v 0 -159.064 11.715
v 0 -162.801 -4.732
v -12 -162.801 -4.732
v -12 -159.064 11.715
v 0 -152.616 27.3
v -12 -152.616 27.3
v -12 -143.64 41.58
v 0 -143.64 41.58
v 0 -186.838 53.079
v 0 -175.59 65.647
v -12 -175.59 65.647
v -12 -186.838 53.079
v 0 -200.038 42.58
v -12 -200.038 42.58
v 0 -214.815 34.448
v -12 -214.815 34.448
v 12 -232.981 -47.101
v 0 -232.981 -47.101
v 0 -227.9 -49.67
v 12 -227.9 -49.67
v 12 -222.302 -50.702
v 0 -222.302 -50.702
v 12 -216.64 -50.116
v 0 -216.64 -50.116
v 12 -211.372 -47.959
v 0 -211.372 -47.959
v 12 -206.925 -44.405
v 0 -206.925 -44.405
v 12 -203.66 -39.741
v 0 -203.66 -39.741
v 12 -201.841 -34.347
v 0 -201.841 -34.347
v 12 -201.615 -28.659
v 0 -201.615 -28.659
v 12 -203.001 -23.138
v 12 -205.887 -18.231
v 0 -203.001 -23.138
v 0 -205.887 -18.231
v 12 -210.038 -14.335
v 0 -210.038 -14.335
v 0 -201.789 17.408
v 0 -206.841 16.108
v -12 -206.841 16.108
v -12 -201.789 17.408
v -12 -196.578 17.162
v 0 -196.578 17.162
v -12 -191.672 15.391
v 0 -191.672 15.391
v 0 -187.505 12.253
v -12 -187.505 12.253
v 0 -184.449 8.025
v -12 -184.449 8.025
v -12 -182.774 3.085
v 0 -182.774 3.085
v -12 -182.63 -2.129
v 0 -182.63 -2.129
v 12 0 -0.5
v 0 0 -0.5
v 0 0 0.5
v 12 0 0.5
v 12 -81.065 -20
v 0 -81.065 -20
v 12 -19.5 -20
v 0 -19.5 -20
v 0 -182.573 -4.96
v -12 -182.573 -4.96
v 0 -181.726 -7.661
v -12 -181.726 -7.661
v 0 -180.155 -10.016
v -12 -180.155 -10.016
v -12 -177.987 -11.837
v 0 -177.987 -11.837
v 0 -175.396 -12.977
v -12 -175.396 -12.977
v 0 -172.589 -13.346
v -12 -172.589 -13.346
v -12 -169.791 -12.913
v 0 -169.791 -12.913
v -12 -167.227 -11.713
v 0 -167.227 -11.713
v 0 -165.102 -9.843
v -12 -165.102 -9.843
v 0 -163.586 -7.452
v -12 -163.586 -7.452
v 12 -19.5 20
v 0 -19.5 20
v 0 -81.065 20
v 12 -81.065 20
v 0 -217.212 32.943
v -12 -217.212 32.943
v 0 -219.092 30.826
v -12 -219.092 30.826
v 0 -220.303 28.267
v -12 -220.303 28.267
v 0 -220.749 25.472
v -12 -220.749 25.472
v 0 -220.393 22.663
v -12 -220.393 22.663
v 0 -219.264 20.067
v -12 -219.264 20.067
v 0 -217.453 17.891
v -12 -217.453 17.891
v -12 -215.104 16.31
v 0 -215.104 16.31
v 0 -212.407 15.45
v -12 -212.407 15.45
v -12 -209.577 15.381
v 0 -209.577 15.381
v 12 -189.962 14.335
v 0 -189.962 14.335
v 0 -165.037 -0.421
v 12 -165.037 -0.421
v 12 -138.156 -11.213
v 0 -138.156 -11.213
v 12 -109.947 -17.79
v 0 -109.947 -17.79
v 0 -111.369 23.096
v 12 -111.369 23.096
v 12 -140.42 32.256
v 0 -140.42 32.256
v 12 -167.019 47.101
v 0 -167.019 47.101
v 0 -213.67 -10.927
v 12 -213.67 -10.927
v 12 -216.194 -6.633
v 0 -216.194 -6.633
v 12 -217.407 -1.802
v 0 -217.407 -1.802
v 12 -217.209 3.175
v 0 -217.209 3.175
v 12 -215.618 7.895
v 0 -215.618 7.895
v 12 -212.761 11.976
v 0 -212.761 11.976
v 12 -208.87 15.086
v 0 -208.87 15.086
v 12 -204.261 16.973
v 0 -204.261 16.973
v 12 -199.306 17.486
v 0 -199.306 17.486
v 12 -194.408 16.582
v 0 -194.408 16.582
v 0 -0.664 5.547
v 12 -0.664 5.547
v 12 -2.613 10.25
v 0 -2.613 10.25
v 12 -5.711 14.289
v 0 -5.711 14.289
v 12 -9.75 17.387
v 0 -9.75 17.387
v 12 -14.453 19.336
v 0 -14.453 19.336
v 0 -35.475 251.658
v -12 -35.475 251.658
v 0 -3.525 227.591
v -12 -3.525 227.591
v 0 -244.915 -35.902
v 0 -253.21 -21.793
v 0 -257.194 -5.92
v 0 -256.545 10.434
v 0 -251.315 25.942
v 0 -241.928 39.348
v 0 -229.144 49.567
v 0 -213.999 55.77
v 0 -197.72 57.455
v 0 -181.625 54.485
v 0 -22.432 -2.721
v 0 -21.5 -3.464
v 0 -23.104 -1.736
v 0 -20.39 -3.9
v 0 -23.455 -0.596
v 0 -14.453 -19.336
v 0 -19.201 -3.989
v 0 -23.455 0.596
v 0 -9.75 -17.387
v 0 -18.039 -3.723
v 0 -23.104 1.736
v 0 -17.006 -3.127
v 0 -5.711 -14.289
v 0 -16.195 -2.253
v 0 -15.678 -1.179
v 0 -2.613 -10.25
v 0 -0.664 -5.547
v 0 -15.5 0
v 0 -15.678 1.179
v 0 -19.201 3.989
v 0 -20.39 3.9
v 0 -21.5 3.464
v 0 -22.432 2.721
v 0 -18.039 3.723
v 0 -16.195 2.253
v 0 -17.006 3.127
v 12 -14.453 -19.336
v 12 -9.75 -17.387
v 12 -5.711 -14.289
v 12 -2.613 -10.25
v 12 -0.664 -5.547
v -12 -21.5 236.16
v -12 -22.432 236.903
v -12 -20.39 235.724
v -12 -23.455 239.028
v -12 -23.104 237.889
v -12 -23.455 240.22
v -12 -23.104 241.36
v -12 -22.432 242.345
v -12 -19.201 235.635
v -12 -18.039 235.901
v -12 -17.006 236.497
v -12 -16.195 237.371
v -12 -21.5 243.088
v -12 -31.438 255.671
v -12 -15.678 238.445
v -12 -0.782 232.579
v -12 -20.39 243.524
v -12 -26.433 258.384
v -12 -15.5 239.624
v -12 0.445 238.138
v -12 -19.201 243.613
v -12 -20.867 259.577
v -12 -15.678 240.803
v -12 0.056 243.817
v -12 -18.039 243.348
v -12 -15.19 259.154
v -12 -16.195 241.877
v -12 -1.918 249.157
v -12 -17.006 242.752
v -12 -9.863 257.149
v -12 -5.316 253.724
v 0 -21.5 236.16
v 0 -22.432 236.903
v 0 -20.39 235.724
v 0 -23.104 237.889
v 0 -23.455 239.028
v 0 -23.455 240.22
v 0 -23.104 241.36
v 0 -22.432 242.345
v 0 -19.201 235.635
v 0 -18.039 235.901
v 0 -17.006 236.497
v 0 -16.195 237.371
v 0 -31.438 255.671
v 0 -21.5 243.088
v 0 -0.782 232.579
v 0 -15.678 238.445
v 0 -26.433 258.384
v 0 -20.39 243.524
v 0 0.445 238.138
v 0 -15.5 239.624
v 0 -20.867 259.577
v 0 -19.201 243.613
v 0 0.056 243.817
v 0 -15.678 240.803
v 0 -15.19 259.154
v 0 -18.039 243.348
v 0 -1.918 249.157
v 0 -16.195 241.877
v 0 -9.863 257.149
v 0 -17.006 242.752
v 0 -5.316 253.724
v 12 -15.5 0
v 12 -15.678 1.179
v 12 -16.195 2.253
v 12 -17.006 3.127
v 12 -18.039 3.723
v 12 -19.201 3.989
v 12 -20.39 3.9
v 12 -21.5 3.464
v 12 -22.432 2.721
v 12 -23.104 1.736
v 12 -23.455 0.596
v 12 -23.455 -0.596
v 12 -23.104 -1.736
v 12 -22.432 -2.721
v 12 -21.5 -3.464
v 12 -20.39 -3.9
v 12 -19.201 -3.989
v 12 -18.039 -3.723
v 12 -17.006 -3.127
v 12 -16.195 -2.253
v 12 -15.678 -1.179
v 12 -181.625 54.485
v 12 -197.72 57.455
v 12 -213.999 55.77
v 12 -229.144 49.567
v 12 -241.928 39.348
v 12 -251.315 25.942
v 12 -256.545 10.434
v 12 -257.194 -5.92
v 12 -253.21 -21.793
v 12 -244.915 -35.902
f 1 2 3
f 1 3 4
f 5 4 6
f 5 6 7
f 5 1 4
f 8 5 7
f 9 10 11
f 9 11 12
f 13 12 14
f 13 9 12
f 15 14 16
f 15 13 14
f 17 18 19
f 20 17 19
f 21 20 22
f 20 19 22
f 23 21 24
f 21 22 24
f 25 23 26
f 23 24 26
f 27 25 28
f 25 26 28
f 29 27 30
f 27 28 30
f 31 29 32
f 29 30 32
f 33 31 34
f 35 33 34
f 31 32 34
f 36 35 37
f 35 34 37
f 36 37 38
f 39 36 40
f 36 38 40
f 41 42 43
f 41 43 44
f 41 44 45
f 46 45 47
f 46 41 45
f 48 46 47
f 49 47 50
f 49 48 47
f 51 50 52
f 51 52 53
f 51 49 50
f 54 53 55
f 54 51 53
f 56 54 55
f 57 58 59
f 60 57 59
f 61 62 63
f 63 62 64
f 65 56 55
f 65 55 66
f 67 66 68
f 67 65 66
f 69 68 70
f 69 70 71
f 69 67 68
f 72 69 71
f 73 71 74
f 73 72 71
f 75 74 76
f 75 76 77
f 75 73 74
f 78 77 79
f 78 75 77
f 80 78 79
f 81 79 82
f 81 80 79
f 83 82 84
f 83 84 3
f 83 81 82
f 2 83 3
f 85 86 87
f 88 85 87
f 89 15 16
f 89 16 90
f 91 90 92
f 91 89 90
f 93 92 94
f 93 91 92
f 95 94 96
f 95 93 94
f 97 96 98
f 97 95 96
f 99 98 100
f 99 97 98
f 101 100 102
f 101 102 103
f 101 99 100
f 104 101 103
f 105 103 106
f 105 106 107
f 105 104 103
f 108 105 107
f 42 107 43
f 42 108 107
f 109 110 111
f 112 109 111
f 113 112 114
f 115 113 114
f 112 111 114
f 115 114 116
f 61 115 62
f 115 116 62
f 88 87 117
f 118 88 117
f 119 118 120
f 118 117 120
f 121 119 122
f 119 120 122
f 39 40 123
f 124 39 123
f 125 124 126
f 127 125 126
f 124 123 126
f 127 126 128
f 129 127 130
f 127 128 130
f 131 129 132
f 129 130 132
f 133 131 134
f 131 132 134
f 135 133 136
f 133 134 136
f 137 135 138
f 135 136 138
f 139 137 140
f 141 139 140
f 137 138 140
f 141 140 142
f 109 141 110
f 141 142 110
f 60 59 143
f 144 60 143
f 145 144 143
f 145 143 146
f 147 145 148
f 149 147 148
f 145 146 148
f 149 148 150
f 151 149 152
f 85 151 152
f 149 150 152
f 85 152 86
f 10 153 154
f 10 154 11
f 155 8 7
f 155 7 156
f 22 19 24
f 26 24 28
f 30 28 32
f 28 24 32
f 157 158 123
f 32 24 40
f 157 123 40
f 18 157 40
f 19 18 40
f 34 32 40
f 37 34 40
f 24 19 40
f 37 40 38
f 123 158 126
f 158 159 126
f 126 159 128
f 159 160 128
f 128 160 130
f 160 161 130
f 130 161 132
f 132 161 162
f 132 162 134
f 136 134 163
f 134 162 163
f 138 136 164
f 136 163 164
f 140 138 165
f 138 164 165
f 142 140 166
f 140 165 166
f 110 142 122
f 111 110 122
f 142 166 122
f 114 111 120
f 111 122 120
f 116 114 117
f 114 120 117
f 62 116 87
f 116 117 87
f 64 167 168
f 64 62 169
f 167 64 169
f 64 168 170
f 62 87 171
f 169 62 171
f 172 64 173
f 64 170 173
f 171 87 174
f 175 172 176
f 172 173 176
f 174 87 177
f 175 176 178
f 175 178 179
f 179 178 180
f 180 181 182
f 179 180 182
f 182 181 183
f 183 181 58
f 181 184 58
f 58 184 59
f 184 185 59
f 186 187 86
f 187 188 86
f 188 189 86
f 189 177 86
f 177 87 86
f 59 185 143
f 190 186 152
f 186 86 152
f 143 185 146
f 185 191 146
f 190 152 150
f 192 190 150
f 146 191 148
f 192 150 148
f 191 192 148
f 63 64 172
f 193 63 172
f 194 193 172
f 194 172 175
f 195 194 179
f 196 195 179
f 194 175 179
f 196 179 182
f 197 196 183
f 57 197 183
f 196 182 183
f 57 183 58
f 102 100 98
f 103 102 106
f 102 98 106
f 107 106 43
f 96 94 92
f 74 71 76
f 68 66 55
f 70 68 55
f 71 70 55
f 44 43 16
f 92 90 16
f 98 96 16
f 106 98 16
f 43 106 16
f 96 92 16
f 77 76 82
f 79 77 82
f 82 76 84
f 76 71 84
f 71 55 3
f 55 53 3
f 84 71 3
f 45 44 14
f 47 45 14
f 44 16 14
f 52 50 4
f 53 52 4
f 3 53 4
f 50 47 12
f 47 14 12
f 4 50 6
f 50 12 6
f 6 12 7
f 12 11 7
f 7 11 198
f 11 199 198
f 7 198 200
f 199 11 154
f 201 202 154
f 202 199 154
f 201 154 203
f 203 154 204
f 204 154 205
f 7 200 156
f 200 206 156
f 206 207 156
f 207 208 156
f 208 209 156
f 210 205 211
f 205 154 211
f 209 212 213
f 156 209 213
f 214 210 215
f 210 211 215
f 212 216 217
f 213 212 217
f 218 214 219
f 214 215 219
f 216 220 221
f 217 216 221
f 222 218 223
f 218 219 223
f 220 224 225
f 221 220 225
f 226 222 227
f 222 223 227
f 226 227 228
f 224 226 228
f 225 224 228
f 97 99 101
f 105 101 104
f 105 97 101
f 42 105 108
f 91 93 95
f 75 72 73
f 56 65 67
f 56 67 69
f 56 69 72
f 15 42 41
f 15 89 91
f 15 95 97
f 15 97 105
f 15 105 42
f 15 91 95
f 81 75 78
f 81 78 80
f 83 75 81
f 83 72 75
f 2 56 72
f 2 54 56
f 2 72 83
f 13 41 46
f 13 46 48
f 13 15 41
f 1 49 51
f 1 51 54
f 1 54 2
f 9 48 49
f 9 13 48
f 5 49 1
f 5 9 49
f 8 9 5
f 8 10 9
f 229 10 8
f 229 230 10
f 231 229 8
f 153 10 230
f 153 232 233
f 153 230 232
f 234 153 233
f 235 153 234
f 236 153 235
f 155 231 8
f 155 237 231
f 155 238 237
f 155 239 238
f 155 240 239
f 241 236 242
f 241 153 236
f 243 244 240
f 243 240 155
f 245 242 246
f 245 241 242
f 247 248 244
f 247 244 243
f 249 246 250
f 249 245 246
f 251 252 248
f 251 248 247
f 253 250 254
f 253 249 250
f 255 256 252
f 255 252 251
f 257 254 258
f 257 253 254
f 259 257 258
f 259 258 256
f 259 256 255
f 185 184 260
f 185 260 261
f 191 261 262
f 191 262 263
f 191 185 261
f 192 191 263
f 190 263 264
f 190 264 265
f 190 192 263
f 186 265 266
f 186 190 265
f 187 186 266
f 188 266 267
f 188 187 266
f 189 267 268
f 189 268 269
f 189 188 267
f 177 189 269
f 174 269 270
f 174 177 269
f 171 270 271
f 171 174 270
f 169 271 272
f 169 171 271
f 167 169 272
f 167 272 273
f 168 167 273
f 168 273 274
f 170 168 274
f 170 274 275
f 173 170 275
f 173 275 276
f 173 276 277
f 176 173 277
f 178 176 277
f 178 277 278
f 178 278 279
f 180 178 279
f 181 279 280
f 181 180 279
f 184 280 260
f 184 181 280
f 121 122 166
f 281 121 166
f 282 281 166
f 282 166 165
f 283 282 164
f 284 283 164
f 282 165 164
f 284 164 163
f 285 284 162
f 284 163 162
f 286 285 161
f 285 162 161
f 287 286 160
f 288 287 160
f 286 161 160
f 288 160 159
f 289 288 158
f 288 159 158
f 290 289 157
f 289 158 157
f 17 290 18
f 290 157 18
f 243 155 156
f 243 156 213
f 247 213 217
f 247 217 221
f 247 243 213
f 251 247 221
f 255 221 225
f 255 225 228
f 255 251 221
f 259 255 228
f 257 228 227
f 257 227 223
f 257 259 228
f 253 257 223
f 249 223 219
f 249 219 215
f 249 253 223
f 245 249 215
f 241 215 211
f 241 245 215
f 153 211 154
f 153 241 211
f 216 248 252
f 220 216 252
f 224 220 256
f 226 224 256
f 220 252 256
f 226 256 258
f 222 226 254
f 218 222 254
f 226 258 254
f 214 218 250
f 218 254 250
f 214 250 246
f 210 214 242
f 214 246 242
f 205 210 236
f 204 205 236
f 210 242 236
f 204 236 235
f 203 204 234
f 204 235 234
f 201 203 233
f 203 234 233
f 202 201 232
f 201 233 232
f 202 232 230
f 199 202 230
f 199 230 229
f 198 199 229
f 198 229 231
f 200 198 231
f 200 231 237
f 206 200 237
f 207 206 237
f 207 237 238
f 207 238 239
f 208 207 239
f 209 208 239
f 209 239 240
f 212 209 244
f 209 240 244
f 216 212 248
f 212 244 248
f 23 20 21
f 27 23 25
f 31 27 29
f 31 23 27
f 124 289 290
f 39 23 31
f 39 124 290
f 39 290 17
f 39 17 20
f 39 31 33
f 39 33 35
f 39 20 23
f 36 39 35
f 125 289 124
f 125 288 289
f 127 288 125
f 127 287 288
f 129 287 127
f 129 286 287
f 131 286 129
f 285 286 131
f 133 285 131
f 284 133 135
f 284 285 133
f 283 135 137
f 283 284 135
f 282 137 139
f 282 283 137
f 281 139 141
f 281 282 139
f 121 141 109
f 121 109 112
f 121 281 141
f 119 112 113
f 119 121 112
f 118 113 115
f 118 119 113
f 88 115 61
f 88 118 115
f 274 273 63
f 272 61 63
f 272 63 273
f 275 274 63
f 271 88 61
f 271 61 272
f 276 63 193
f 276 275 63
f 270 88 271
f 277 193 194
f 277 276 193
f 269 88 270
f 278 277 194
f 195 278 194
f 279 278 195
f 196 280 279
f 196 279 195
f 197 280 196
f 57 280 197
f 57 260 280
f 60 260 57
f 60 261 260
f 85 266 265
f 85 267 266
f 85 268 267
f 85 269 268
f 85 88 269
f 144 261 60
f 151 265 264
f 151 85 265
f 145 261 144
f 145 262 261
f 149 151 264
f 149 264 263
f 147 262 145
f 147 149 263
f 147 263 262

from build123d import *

# Parameters (mm, degrees)
F0_R     = 4
F1_DEPTH = 12
F2_R     = 4
F3_DEPTH = 12


with BuildPart() as f1:
    # F0 (on Right) → F1 (new body)
    with BuildSketch(Plane.YZ):
        with BuildLine():
            ThreePointArc((-210.037588, -14.335161), (-214.335161, 10.037588), (-189.962412, 14.335161))
            ThreePointArc((-189.962412, 14.335161), (-138.156147, -11.212862), (-81.065195, -20))
            Line((-81.065195, -20), (-19.5, -20))
            ThreePointArc((-19.5, -20), (-5.711418, -14.288582), (0, -0.5))
            Line((0, -0.5), (0, 0.5))
            ThreePointArc((0, 0.5), (-5.711418, 14.288582), (-19.5, 20))
            Line((-19.5, 20), (-81.065195, 20))
            ThreePointArc((-81.065195, 20), (-126.127915, 26.935816), (-167.019355, 47.101243))
            ThreePointArc((-167.019355, 47.101243), (-247.101243, 32.980645), (-232.980645, -47.101243))
            ThreePointArc((-232.980645, -47.101243), (-205.126075, -42.18973), (-210.037588, -14.335161))
        make_face()
        with Locations((-19.5, 0)):
            Circle(F0_R, mode=Mode.SUBTRACT)
    extrude(amount=F1_DEPTH)


with BuildPart() as f3:
    # F2 (on Right) → F3 (new body)
    with BuildSketch(Plane.YZ):
        with BuildLine():
            ThreePointArc((-206.840787, 16.107565), (-189.470833, 13.978077), (-182.630046, -2.129487))
            ThreePointArc((-182.630046, -2.129487), (-174.005561, -13.261319), (-162.800799, -4.731798))
            ThreePointArc((-162.800799, -4.731798), (-156.168814, 19.644102), (-143.639929, 41.580255))
            Line((-143.639929, 41.580255), (-3.525054, 227.590852))
            ThreePointArc((-3.525054, 227.590852), (-7.466667, 255.599131), (-35.474946, 251.657518))
            Line((-35.474946, 251.657518), (-175.589821, 65.646922))
            ThreePointArc((-175.589821, 65.646922), (-193.216053, 47.550412), (-214.814784, 34.448405))
            ThreePointArc((-214.814784, 34.448405), (-219.92056, 21.324744), (-206.840787, 16.107565))
        make_face()
        with Locations((-19.5, 239.624185)):
            Circle(F2_R, mode=Mode.SUBTRACT)
    extrude(amount=-F3_DEPTH)


solid = Compound([f1.part, f3.part])
